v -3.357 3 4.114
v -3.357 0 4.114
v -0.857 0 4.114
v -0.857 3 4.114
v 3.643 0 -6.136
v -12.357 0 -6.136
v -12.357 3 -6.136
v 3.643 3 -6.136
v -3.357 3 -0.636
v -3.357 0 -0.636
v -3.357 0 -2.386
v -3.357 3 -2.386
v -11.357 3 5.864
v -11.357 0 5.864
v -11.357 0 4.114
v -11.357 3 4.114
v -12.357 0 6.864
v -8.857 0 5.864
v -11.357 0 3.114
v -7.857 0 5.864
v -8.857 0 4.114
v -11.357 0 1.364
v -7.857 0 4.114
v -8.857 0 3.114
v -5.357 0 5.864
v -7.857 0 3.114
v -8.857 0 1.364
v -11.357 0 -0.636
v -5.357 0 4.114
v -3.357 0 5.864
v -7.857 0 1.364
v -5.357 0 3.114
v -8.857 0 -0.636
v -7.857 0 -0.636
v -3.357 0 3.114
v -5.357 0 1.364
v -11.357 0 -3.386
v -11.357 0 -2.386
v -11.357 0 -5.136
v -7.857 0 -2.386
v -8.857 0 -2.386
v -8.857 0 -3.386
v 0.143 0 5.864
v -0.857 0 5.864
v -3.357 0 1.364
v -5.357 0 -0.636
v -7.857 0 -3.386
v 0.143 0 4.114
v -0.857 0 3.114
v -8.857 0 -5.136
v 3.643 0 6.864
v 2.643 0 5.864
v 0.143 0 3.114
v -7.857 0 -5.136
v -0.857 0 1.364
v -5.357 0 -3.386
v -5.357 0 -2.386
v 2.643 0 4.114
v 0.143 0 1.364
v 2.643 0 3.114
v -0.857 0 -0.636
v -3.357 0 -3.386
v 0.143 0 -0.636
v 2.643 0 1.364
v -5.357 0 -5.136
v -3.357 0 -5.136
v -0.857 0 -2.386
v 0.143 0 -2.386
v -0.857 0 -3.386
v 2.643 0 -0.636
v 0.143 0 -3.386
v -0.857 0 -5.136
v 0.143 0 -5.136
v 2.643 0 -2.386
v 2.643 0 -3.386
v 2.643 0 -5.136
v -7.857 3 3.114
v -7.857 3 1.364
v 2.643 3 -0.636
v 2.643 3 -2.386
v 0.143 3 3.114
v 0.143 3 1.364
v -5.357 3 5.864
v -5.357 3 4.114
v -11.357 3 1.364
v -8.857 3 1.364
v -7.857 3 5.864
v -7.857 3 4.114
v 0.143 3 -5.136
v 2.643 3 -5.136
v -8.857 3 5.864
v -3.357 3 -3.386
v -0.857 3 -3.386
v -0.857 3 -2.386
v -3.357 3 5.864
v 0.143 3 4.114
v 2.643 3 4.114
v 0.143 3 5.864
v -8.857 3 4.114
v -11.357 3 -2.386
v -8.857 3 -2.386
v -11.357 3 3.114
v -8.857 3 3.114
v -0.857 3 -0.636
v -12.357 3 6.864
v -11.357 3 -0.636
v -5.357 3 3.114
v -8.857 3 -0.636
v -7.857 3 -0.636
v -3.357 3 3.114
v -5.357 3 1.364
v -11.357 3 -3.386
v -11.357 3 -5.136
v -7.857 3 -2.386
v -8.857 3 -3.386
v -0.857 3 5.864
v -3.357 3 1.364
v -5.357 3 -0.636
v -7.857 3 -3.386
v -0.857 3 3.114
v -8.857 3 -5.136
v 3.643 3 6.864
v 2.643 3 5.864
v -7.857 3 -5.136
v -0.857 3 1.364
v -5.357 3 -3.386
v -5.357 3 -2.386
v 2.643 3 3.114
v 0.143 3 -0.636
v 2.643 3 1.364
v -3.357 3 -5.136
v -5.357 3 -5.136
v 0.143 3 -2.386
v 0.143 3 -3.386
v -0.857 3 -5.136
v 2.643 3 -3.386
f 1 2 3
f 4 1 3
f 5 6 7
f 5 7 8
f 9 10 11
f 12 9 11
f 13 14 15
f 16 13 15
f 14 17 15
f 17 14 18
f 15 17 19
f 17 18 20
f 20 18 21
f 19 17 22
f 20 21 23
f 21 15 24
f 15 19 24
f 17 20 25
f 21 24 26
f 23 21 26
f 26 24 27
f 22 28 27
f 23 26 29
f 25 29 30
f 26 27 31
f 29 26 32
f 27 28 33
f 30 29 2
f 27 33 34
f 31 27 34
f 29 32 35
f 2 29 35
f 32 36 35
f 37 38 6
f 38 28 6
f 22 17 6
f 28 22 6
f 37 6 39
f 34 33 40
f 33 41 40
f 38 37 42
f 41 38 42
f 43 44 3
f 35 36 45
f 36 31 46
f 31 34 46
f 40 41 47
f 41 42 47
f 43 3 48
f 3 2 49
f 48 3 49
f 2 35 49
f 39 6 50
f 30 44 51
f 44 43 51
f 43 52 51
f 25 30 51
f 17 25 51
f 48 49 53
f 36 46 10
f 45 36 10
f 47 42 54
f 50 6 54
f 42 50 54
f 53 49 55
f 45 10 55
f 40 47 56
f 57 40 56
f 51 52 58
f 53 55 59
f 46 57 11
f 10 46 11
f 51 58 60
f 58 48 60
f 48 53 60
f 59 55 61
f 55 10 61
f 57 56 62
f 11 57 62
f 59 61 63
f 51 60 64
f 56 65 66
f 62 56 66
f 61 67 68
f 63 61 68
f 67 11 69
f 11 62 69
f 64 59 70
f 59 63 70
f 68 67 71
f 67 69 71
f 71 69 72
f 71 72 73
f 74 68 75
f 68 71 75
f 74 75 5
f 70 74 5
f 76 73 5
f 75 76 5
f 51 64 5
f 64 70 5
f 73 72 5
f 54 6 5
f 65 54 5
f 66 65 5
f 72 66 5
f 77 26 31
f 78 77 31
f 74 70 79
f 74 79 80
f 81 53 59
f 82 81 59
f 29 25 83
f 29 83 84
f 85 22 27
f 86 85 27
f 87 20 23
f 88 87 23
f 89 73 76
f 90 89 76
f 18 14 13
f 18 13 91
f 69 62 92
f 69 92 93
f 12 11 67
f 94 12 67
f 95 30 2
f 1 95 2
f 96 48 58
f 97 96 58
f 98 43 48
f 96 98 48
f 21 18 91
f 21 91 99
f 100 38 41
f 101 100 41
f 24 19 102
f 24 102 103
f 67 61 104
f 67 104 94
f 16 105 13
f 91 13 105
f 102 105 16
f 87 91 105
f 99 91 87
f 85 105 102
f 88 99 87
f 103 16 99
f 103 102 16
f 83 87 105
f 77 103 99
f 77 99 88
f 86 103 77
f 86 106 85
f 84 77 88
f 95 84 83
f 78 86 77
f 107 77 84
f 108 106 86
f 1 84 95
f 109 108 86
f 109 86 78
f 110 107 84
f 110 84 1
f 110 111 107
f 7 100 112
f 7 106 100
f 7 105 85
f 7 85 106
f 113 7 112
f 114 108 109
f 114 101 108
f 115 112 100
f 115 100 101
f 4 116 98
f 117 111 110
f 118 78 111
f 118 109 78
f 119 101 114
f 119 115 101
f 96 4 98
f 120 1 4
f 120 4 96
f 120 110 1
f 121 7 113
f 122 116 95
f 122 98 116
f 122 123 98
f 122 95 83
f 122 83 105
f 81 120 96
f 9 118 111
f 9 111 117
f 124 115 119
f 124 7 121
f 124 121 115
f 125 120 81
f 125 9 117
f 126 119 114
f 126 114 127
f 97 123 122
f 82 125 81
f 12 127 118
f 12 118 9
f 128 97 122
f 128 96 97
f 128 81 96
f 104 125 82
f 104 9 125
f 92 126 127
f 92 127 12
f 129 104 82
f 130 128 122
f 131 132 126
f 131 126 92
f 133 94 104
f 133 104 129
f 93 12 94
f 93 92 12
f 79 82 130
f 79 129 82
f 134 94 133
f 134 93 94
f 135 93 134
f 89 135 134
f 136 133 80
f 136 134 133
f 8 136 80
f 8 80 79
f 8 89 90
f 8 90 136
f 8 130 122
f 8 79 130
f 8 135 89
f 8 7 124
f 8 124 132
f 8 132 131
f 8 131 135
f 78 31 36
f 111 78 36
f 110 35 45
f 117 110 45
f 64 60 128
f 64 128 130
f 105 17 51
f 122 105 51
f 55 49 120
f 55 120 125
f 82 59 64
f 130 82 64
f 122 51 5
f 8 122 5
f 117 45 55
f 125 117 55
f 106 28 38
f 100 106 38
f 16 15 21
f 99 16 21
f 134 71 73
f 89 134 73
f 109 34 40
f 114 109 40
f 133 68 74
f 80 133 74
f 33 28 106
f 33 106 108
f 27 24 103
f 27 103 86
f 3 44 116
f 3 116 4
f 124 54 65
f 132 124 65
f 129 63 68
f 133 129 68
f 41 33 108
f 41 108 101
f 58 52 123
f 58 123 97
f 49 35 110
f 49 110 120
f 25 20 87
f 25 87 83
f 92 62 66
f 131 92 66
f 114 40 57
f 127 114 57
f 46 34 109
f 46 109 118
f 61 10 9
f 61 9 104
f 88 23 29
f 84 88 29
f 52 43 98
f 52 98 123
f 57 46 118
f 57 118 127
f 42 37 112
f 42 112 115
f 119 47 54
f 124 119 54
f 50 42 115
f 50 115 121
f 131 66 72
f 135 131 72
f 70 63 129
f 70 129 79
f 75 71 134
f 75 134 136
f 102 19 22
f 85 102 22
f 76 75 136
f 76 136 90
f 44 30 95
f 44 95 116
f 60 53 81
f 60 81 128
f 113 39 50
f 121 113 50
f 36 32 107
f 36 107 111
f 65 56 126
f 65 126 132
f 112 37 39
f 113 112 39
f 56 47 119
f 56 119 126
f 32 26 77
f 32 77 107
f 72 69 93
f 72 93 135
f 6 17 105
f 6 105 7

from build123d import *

# Parameters (mm, degrees)
SKETCH1_W           = 16
SKETCH1_H           = 13
SKETCH1_W_2         = 2.5
SKETCH1_H_2         = 1.75
BOSS_EXTRUDE1_DEPTH = 3


with BuildPart() as part:
    # Sketch1 → Boss-Extrude1 (new body)
    with BuildSketch(Plane(origin=(0, 0, 0), x_dir=(1, 0, 0), z_dir=(0, 1, 0))):
        with Locations((-4.357364788, -0.36440678)):
            Rectangle(SKETCH1_W, SKETCH1_H)
        with Locations((-10.107364788, 1.51059322)):
            Rectangle(SKETCH1_W_2, SKETCH1_H_2, mode=Mode.SUBTRACT)
        with Locations((-10.107364788, 4.26059322)):
            Rectangle(SKETCH1_W_2, SKETCH1_H_2, mode=Mode.SUBTRACT)
        with Locations((-6.607364788, 1.51059322)):
            Rectangle(SKETCH1_W_2, SKETCH1_H_2, mode=Mode.SUBTRACT)
        with Locations((-6.607364788, 4.26059322)):
            Rectangle(SKETCH1_W_2, SKETCH1_H_2, mode=Mode.SUBTRACT)
        with Locations((-6.607364788, -2.23940678)):
            Rectangle(SKETCH1_W_2, SKETCH1_H_2, mode=Mode.SUBTRACT)
        with Locations((-10.107364788, -2.23940678)):
            Rectangle(SKETCH1_W_2, SKETCH1_H_2, mode=Mode.SUBTRACT)
        with Locations((-6.607364788, -4.98940678)):
            Rectangle(SKETCH1_W_2, SKETCH1_H_2, mode=Mode.SUBTRACT)
        with Locations((-10.107364788, -4.98940678)):
            Rectangle(SKETCH1_W_2, SKETCH1_H_2, mode=Mode.SUBTRACT)
        with Locations((-2.107364788, -4.98940678)):
            Rectangle(SKETCH1_W_2, SKETCH1_H_2, mode=Mode.SUBTRACT)
        with Locations((1.392635212, -4.98940678)):
            Rectangle(SKETCH1_W_2, SKETCH1_H_2, mode=Mode.SUBTRACT)
        with Locations((-2.107364788, -2.23940678)):
            Rectangle(SKETCH1_W_2, SKETCH1_H_2, mode=Mode.SUBTRACT)
        with Locations((1.392635212, -2.23940678)):
            Rectangle(SKETCH1_W_2, SKETCH1_H_2, mode=Mode.SUBTRACT)
        with Locations((-2.107364788, 1.51059322)):
            Rectangle(SKETCH1_W_2, SKETCH1_H_2, mode=Mode.SUBTRACT)
        with Locations((1.392635212, 1.51059322)):
            Rectangle(SKETCH1_W_2, SKETCH1_H_2, mode=Mode.SUBTRACT)
        with Locations((-2.107364788, 4.26059322)):
            Rectangle(SKETCH1_W_2, SKETCH1_H_2, mode=Mode.SUBTRACT)
        with Locations((1.392635212, 4.26059322)):
            Rectangle(SKETCH1_W_2, SKETCH1_H_2, mode=Mode.SUBTRACT)
    extrude(amount=BOSS_EXTRUDE1_DEPTH)


solid = part.part
